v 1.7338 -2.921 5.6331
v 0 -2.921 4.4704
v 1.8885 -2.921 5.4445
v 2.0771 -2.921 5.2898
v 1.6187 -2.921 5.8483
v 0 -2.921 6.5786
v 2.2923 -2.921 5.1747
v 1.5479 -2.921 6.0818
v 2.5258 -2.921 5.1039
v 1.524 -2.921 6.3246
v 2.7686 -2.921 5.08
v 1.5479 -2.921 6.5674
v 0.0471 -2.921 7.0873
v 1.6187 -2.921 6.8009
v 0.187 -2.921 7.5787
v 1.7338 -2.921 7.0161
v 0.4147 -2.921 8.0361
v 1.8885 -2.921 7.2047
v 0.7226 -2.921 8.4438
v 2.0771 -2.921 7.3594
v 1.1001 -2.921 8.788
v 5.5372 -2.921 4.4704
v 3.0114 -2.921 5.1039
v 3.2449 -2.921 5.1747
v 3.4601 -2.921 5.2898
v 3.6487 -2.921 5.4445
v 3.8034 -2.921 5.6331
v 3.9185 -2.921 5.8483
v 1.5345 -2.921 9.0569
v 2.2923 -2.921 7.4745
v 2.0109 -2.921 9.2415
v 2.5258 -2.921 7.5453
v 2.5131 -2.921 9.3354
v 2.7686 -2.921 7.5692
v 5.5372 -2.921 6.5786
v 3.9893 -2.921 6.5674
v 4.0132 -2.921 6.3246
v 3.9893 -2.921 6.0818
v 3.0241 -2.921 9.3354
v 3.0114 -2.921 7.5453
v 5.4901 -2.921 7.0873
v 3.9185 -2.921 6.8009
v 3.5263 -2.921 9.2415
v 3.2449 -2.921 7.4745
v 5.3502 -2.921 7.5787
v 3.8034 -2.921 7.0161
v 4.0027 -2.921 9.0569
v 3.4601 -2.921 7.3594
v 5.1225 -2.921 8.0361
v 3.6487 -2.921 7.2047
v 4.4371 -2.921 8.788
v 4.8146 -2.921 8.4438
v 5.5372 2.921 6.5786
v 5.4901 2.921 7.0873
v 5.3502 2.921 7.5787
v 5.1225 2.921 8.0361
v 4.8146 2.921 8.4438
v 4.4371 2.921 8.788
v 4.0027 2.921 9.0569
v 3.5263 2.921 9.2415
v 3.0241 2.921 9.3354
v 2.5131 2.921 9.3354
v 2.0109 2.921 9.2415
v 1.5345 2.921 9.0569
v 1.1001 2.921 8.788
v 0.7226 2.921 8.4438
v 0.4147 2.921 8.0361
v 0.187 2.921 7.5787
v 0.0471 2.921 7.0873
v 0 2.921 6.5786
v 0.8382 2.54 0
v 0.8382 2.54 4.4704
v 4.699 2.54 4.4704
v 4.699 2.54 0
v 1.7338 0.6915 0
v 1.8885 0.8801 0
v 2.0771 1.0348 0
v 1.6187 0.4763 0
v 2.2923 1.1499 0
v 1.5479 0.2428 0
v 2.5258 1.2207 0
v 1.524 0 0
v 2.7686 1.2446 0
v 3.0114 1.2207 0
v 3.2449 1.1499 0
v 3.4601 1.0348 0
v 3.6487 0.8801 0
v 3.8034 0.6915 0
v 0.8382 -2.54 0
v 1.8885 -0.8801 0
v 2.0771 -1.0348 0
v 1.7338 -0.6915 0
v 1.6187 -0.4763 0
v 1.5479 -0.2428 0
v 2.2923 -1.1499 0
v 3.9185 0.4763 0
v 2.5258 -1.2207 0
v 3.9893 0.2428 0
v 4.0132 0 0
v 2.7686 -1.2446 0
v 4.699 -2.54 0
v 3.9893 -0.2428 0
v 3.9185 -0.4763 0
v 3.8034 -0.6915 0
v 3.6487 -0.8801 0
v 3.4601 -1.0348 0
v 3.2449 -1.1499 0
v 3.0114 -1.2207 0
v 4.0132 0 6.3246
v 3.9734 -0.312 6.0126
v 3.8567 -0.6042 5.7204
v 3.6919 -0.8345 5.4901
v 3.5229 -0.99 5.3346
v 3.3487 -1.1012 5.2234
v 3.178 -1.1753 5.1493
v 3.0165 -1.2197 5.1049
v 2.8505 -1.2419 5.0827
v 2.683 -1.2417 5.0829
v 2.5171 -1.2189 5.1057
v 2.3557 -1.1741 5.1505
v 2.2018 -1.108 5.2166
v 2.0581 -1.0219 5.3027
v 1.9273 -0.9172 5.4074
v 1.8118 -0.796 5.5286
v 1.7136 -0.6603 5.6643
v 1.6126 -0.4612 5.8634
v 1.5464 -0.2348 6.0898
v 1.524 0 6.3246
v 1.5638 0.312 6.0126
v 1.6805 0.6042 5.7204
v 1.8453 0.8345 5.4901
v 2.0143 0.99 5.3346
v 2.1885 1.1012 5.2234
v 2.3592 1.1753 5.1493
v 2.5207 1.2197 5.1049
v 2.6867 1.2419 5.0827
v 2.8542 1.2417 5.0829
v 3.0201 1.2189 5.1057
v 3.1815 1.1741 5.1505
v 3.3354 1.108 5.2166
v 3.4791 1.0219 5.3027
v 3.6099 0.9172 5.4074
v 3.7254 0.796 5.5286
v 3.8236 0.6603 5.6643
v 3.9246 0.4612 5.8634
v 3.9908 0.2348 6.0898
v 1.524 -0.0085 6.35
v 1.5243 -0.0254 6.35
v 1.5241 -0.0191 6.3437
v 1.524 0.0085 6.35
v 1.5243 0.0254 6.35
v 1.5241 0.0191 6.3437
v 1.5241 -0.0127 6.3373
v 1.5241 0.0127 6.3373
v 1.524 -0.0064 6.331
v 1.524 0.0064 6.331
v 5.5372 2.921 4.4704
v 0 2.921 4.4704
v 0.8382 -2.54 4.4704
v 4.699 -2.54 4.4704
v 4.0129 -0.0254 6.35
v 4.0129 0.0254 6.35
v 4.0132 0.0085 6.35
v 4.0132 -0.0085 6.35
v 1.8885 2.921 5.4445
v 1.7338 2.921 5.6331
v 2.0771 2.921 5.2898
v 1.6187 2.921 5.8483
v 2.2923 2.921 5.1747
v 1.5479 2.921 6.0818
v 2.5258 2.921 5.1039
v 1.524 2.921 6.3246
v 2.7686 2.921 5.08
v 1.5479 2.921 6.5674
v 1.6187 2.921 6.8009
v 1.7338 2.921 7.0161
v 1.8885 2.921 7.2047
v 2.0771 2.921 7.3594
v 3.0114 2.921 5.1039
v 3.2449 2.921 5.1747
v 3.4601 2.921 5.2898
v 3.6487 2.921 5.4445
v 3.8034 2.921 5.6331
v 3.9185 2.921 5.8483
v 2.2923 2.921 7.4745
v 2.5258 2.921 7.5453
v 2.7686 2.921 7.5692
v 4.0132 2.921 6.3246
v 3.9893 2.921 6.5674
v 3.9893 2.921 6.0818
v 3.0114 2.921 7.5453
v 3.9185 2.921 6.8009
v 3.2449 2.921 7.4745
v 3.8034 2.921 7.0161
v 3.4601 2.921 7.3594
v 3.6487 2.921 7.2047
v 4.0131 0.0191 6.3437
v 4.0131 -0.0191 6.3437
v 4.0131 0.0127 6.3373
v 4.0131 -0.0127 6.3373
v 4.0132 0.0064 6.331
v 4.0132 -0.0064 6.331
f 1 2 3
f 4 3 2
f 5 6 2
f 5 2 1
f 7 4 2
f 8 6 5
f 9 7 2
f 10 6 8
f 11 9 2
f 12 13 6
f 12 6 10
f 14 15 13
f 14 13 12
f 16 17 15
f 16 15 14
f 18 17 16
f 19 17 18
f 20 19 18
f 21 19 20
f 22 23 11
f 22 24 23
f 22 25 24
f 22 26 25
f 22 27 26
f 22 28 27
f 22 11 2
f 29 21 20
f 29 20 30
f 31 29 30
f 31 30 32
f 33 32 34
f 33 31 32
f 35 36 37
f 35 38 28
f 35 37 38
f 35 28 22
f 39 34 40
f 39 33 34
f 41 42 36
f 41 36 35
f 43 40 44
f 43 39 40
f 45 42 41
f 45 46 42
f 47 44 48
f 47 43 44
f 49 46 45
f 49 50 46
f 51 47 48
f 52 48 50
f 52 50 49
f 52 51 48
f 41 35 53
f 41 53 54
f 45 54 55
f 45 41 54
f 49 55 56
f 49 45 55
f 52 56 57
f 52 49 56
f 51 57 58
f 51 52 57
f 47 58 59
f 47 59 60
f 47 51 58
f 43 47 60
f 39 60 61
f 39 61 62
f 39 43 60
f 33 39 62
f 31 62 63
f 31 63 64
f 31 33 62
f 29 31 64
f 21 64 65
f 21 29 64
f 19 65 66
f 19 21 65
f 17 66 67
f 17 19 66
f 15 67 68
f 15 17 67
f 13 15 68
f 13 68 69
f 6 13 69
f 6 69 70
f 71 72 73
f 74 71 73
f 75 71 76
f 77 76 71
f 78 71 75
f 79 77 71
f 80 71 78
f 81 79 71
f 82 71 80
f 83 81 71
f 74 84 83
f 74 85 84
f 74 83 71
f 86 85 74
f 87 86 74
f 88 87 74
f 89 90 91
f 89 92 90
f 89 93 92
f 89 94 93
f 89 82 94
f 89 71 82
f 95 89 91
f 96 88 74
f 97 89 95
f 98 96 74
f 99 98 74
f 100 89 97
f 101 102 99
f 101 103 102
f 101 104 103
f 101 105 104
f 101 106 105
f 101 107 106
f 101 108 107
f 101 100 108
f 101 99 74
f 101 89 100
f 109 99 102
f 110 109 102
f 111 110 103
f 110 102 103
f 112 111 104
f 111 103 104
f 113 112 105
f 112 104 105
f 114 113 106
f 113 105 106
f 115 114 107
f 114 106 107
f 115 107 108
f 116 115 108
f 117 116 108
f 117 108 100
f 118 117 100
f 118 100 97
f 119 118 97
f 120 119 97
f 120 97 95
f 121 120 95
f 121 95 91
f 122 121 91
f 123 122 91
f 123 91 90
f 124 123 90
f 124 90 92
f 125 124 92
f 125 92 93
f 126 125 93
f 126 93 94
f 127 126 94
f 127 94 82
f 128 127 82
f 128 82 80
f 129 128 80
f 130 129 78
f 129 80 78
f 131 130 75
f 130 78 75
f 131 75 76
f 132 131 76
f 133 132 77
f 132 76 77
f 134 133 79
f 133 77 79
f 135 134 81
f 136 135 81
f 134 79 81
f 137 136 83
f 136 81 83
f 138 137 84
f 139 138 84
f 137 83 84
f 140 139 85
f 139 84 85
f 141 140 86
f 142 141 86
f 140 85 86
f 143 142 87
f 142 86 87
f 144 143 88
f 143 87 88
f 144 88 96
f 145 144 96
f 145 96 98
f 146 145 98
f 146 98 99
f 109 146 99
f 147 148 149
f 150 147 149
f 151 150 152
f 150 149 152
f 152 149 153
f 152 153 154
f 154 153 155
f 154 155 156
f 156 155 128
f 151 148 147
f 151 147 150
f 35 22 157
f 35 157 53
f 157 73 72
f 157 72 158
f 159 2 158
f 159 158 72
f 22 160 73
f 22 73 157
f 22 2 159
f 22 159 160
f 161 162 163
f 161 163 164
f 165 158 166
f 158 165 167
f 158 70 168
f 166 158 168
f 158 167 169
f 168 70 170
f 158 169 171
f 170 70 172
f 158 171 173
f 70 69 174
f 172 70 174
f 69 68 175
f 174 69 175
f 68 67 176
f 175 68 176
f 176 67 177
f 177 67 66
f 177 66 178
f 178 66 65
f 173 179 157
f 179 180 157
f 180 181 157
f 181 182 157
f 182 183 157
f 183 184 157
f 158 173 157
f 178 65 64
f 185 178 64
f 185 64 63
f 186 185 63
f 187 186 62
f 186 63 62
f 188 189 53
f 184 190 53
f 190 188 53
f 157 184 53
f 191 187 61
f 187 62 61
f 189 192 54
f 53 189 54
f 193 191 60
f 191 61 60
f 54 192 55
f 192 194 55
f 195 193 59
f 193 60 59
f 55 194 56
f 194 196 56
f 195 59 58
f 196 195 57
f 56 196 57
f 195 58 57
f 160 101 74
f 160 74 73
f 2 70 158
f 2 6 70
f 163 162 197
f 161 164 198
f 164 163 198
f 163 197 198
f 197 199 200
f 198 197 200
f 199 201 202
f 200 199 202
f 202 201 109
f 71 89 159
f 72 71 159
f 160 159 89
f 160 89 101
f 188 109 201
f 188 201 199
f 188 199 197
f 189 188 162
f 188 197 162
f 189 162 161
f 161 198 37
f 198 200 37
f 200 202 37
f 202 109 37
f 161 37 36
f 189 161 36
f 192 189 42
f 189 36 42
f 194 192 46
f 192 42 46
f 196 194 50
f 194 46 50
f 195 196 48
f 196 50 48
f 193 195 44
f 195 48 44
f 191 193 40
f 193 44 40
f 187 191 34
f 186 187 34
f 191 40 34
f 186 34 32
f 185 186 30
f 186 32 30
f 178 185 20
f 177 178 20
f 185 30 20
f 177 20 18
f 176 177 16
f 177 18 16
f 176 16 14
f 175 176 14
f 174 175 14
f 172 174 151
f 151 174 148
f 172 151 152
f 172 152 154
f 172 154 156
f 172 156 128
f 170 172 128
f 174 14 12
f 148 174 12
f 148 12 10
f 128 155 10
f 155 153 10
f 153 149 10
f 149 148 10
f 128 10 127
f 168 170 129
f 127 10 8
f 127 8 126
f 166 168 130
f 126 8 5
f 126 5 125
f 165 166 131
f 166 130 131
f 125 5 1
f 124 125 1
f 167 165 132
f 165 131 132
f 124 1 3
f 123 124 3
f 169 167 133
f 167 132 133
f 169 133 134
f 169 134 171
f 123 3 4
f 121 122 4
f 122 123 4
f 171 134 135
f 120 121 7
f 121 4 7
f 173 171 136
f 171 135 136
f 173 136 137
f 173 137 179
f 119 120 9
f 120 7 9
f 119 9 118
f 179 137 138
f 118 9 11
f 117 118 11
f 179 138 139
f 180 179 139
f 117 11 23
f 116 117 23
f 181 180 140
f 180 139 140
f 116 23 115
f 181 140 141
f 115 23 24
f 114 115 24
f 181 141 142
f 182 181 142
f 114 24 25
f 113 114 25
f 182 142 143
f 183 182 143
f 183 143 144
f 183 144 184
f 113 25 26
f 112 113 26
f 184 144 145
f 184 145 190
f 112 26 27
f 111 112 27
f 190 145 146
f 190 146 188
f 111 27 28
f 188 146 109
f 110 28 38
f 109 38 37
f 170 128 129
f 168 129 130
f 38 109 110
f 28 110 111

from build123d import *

# Parameters (mm, degrees)
F0_R     = 1.2446
F1_DEPTH = 2.921
F0_W     = 3.8608
F0_H     = 4.4704
F2_DEPTH = 2.54
F3_DEPTH = 2.921
F4_DEPTH = 2.54
F5_R     = 1.2446
F6_DEPTH = 6.35


with BuildPart() as f1:
    # F0 (on Front) → F1 (new body)
    with BuildSketch(Plane.XZ):
        with BuildLine():
            Line((0, 4.4704), (0.8382, 4.4704))
            Line((0.8382, 4.4704), (4.699, 4.4704))
            Line((4.699, 4.4704), (5.5372, 4.4704))
            Line((5.5372, 4.4704), (5.5372, 6.5786))
            ThreePointArc((5.5372, 6.5786), (2.7686, 9.3472), (0, 6.5786))
            Line((0, 6.5786), (0, 4.4704))
        make_face()
        with Locations((2.7686, 6.3246)):
            Circle(F0_R, mode=Mode.SUBTRACT)
    extrude(amount=F1_DEPTH)

    # F0 (on Front) → F2 (join)
    with BuildSketch(Plane.XZ):
        with Locations((2.7686, 2.2352)):
            Rectangle(F0_W, F0_H)
    extrude(amount=F2_DEPTH)

    # F0 (on Front) → F3 (join)
    with BuildSketch(Plane.XZ):
        with BuildLine():
            Line((0, 4.4704), (0.8382, 4.4704))
            Line((0.8382, 4.4704), (4.699, 4.4704))
            Line((4.699, 4.4704), (5.5372, 4.4704))
            Line((5.5372, 4.4704), (5.5372, 6.5786))
            ThreePointArc((5.5372, 6.5786), (2.7686, 9.3472), (0, 6.5786))
            Line((0, 6.5786), (0, 4.4704))
        make_face()
        with Locations((2.7686, 6.3246)):
            Circle(F0_R, mode=Mode.SUBTRACT)
    extrude(amount=-F3_DEPTH)

    # F0 (on Front) → F4 (join)
    with BuildSketch(Plane.XZ):
        with Locations((2.7686, 2.2352)):
            Rectangle(F0_W, F0_H)
    extrude(amount=-F4_DEPTH)

    # F5 (on face) → F6 (cut)
    with BuildSketch(Plane(origin=(0, 0, 0), x_dir=(1, 0, 0), z_dir=(0, 0, -1))):
        with Locations((2.7686, 0)):
            Circle(F5_R)
    extrude(amount=-F6_DEPTH, mode=Mode.SUBTRACT)


solid = f1.part
